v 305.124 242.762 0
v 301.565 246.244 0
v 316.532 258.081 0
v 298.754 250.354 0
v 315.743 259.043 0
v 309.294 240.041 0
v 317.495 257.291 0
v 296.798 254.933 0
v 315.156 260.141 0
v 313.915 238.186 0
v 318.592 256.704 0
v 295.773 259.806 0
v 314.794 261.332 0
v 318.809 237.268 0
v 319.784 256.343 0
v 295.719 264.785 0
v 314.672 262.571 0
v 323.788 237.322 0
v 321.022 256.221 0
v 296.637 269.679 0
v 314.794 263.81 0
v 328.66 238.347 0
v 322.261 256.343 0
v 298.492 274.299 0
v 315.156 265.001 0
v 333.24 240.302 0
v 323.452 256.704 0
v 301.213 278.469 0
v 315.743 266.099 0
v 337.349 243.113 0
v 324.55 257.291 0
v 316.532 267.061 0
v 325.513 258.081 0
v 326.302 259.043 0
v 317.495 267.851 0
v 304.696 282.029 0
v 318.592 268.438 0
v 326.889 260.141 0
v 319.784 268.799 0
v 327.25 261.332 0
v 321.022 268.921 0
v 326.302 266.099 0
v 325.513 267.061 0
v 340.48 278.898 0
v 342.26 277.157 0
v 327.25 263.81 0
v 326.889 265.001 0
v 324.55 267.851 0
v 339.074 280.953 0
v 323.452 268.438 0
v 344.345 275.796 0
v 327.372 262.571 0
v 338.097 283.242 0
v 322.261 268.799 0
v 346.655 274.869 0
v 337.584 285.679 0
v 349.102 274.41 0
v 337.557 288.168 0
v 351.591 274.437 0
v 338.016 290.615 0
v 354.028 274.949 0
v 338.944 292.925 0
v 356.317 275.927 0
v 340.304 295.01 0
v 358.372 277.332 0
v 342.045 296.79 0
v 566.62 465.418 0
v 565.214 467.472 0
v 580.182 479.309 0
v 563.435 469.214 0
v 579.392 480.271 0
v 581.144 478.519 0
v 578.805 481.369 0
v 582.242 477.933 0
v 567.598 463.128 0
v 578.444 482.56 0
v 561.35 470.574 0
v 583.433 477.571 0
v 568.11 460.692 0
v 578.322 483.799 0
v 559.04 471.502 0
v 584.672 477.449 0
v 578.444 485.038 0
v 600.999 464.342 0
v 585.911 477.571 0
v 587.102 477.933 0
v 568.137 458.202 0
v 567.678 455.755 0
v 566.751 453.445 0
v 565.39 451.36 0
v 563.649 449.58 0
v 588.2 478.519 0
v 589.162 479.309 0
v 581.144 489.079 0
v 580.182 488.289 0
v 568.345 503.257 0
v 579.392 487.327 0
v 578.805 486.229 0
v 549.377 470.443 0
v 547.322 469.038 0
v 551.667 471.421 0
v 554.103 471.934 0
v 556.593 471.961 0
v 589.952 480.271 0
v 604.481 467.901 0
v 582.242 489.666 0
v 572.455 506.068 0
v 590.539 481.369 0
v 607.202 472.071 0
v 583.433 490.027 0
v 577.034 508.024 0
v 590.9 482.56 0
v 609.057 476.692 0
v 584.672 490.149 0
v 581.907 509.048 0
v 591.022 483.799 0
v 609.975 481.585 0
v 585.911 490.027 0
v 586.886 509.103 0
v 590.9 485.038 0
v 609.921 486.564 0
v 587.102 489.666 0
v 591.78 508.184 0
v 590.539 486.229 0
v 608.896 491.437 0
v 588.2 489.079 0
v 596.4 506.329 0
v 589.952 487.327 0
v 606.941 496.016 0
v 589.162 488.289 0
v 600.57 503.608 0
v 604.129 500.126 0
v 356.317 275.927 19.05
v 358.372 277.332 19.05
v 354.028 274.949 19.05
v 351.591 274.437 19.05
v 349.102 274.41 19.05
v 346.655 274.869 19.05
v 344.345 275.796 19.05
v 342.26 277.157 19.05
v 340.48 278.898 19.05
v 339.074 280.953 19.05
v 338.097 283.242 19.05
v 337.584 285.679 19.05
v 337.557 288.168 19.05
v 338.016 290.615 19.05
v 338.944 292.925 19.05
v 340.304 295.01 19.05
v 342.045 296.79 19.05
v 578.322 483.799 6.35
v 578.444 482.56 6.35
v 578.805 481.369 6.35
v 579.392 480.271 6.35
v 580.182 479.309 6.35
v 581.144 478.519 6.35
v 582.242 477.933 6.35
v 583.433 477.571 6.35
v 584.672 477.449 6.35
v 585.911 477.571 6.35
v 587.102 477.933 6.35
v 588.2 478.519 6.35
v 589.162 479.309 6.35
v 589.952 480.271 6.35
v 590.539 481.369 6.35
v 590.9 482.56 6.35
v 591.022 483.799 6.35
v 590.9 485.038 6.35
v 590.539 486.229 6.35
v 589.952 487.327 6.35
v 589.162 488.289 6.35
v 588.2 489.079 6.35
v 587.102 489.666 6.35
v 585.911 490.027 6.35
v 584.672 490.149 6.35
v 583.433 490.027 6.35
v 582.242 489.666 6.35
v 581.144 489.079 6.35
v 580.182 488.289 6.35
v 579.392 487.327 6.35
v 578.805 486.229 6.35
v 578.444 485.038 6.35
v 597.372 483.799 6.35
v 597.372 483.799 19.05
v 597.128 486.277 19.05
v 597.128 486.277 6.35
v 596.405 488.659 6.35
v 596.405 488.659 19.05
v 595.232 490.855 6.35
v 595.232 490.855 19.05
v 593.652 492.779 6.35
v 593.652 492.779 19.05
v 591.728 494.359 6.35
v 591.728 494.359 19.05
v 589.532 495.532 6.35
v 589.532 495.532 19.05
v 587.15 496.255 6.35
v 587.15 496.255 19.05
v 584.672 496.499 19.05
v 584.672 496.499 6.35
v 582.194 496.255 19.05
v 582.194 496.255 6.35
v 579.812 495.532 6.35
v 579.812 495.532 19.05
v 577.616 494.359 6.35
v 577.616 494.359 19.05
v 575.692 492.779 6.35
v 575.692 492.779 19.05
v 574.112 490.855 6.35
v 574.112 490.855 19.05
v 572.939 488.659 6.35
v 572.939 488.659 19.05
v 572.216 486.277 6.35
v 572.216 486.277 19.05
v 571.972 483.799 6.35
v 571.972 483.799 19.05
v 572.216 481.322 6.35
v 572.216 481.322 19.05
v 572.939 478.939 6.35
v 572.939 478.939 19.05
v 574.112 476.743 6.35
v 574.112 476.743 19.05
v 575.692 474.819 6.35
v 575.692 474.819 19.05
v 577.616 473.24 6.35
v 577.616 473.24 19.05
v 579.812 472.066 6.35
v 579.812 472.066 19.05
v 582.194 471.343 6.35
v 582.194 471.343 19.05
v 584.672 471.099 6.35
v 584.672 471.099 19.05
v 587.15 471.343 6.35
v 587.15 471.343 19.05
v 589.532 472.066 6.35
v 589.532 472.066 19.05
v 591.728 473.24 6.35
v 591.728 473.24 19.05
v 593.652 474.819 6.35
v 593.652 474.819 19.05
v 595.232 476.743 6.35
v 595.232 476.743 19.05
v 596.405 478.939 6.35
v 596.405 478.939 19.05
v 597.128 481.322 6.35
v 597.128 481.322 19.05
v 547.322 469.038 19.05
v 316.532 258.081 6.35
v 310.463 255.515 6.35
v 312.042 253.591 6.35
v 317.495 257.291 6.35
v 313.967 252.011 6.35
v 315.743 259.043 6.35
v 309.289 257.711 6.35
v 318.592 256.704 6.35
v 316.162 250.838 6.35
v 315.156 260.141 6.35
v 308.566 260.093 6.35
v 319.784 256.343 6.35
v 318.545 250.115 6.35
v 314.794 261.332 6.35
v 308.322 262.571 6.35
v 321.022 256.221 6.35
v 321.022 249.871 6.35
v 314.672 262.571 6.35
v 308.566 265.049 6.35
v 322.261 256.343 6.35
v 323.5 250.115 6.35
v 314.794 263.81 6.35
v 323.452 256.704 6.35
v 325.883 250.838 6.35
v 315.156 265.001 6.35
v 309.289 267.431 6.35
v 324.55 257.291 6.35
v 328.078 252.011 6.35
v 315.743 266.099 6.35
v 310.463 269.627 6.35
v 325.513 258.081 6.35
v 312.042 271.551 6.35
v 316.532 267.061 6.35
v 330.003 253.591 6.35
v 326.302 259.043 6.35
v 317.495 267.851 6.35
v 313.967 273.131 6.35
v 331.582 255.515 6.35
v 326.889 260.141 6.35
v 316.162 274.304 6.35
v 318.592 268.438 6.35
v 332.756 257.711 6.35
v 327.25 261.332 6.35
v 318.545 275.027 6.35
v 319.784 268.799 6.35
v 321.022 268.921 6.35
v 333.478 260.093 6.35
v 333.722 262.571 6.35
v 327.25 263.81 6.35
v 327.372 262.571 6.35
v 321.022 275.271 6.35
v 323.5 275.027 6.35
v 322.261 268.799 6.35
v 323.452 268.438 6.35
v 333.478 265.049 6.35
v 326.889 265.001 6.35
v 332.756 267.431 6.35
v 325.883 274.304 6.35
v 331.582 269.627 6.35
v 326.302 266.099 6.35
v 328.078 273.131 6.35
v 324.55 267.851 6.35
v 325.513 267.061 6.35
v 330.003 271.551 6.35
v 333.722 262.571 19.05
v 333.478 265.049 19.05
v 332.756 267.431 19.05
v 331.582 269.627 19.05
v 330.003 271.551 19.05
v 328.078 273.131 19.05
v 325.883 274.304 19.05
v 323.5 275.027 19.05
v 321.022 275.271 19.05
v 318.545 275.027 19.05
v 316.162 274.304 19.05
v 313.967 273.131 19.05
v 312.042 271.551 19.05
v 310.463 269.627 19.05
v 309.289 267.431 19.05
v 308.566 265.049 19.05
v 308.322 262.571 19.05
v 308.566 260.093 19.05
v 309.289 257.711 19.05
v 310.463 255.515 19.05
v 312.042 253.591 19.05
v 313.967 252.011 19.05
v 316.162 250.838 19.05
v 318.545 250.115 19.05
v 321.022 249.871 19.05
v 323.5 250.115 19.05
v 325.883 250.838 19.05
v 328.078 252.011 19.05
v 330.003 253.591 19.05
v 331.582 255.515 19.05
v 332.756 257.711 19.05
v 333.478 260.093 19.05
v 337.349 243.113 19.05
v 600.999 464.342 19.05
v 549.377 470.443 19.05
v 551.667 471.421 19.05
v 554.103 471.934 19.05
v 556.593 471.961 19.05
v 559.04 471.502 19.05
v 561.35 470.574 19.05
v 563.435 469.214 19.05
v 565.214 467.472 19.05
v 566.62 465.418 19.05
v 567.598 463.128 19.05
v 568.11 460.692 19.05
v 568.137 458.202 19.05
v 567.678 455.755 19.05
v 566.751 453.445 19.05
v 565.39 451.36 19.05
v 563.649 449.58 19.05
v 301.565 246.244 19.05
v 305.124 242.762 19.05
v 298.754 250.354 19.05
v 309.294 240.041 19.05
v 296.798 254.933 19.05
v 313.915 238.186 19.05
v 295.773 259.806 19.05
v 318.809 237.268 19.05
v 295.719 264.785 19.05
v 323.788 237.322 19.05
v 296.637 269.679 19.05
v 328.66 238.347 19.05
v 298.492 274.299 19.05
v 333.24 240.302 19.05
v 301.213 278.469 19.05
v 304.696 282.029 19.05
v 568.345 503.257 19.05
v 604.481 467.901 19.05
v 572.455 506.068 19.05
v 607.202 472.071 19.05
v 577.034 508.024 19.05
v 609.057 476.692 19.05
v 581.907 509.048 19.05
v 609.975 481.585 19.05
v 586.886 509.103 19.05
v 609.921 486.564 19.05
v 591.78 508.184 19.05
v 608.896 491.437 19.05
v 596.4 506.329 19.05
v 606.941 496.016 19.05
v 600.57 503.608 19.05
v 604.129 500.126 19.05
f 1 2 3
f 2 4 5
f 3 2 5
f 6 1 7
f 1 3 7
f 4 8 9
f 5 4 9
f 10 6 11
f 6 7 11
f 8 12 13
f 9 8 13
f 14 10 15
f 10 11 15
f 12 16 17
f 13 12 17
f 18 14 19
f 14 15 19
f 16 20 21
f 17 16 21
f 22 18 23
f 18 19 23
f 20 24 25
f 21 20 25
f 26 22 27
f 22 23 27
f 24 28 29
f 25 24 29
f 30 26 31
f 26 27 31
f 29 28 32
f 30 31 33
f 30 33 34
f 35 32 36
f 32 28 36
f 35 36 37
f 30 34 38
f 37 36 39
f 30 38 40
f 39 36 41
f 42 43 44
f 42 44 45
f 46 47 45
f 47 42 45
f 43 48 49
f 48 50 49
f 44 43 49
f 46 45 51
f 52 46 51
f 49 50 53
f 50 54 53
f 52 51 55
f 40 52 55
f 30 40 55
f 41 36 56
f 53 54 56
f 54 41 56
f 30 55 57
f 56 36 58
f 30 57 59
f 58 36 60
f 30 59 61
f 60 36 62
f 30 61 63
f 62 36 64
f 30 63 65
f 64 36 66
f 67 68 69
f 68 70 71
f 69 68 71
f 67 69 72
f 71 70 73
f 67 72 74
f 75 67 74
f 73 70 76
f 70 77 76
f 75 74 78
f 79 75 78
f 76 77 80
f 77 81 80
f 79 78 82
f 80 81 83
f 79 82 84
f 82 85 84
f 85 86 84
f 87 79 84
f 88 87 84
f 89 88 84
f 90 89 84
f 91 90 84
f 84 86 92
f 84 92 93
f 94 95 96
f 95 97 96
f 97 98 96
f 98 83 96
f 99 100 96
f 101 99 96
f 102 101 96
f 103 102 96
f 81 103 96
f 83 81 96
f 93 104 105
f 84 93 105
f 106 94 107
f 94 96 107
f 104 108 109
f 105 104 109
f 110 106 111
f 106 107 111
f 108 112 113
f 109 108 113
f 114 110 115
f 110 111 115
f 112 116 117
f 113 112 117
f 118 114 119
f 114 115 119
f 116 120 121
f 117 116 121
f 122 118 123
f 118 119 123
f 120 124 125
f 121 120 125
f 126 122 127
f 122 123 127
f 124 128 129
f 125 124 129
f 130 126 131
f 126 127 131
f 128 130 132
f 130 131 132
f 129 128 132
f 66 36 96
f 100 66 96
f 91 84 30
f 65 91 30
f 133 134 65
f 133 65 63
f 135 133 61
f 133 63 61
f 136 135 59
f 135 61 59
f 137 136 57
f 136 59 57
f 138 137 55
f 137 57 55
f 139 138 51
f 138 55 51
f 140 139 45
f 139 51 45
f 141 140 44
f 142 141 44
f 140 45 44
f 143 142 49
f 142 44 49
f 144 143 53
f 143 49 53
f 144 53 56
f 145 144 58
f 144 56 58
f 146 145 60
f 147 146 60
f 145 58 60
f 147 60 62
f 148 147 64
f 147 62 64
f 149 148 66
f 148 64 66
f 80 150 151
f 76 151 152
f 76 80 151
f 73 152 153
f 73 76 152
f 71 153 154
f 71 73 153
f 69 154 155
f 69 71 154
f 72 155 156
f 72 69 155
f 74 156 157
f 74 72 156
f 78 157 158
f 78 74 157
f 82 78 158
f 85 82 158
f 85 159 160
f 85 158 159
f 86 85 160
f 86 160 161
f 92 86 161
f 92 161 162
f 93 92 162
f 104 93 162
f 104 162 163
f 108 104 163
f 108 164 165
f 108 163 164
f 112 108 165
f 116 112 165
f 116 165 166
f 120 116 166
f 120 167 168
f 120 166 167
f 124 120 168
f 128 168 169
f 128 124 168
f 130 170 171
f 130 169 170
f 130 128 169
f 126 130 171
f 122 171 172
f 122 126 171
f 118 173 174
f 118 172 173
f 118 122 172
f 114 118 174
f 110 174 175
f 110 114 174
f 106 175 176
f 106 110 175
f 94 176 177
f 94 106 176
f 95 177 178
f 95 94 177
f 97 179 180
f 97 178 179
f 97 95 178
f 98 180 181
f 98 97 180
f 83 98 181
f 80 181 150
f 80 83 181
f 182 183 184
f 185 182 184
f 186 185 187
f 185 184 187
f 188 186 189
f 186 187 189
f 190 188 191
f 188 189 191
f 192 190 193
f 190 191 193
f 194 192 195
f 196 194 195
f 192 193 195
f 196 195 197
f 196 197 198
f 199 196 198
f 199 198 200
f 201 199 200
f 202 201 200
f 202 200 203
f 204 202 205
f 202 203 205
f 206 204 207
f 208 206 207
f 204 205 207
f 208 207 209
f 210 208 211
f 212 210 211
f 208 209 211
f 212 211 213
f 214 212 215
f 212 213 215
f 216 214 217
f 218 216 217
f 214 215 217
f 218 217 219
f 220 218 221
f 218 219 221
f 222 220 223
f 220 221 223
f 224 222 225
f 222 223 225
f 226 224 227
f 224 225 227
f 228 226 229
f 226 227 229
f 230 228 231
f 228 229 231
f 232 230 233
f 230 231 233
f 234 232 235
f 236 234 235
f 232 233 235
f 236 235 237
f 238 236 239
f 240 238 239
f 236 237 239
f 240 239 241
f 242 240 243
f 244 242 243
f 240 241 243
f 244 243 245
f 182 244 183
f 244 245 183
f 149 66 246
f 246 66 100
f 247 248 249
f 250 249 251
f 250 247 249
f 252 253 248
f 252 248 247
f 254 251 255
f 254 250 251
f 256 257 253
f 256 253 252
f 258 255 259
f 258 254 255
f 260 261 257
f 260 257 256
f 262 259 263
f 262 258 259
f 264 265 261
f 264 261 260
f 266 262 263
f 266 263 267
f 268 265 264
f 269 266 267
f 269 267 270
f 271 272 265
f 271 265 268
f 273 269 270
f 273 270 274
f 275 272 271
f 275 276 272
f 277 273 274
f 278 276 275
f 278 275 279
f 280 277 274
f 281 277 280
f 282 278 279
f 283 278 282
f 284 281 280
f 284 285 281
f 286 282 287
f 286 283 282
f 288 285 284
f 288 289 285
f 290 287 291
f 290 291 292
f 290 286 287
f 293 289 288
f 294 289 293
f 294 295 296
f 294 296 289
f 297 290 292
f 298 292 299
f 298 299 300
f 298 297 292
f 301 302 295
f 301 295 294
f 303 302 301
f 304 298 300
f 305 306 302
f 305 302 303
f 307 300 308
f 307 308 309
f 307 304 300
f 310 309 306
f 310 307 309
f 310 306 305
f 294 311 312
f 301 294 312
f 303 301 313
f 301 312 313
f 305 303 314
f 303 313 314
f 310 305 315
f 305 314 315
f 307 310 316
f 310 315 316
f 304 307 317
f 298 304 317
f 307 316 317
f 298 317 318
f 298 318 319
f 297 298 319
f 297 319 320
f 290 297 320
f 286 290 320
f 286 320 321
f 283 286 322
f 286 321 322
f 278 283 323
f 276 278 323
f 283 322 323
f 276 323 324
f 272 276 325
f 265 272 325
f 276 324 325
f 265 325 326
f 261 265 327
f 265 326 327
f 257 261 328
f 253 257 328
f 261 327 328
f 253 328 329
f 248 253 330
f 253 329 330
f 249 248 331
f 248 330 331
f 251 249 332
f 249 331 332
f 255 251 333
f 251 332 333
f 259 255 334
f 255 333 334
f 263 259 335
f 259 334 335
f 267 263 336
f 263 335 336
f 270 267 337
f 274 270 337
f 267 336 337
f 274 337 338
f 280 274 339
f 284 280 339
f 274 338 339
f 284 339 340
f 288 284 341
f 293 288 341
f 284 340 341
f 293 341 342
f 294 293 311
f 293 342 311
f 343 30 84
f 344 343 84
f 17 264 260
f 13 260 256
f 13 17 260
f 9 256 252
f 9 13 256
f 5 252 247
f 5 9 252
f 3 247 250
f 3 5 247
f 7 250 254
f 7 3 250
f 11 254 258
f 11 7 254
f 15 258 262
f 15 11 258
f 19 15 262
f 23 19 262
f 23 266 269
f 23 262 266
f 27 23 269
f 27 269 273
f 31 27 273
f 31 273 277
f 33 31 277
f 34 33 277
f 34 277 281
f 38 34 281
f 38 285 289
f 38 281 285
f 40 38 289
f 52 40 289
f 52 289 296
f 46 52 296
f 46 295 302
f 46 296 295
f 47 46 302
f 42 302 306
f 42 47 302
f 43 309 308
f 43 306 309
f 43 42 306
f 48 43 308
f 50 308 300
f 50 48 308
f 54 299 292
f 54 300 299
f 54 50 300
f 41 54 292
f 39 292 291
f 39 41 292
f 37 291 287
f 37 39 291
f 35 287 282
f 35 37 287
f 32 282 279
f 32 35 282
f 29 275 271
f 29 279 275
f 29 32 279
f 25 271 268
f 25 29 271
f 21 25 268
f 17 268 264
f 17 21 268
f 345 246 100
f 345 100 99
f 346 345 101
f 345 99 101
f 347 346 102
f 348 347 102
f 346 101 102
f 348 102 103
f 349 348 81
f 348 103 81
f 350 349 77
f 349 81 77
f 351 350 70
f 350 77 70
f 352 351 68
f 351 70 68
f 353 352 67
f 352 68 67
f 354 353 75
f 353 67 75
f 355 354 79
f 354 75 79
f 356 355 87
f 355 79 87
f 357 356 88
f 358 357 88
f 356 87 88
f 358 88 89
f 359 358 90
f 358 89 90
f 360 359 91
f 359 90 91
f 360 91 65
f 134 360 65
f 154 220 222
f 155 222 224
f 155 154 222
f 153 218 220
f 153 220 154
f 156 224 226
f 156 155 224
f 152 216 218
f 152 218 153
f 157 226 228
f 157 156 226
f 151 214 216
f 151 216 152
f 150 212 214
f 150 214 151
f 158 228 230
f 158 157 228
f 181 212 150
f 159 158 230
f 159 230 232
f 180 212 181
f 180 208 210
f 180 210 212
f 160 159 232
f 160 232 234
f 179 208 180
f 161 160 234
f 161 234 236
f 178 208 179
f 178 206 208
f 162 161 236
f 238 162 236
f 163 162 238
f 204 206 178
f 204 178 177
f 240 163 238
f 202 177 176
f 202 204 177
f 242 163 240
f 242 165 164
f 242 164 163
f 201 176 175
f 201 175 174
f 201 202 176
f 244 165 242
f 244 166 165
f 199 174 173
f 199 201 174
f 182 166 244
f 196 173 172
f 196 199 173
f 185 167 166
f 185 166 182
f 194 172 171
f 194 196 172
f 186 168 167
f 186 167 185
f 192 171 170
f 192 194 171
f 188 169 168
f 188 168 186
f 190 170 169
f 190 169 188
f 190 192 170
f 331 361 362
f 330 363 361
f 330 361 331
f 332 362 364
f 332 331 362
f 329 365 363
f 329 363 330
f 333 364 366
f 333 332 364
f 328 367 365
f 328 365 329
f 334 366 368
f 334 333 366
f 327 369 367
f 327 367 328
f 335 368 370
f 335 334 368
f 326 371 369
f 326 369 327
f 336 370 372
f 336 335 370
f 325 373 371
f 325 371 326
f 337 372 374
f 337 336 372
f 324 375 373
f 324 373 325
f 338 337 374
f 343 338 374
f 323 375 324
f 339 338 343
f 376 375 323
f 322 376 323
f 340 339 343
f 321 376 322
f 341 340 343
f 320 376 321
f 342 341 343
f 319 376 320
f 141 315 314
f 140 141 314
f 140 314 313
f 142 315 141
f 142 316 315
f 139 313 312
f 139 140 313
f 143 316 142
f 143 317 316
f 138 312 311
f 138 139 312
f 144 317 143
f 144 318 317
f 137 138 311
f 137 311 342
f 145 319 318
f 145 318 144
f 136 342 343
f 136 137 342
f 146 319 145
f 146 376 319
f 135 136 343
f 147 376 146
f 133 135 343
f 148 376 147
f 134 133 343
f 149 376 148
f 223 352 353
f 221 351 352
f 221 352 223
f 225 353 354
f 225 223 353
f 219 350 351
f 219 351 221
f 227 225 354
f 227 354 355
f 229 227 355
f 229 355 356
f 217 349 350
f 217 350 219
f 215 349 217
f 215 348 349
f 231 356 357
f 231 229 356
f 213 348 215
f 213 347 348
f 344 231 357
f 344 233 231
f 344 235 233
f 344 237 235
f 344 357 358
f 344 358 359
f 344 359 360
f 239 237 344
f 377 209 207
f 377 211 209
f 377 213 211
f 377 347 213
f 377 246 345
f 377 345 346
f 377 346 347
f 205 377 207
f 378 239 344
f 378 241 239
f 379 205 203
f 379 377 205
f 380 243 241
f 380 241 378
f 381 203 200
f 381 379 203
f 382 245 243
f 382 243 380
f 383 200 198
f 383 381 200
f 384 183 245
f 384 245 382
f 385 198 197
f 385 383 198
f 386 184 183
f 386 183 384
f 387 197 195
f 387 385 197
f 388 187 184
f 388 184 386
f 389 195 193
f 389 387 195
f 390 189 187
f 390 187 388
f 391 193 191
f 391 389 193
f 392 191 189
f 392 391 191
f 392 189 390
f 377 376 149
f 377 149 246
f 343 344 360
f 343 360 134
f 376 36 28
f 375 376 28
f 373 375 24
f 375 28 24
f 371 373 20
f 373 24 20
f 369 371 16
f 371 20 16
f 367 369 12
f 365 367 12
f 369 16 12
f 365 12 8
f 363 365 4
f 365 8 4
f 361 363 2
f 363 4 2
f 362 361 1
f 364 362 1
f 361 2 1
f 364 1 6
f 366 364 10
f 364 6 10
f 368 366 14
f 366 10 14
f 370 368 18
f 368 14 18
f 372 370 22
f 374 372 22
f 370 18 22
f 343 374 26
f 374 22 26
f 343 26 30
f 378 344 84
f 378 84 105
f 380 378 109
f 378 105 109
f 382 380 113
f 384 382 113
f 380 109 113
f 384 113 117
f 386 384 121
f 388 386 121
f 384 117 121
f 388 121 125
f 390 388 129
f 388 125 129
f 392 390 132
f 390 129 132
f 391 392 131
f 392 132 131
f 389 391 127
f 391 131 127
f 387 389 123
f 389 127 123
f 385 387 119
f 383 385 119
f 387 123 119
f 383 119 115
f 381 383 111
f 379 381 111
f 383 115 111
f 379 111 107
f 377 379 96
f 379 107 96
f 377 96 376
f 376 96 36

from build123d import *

# Parameters (mm, degrees)
SKETCH1_R           = 6.35
BOSS_EXTRUDE1_DEPTH = 19.05
SKETCH2_R           = 12.7
CUT_EXTRUDE1_DEPTH  = 12.7


with BuildPart() as part:
    # Sketch1 → Boss-Extrude1 (new body)
    with BuildSketch(Plane.XY):
        with BuildLine():
            Line((568.345160721, 503.256723569), (304.695644733, 282.028511943))
            ThreePointArc((304.695644733, 282.028511943), (301.564919628, 246.244179632), (337.349251645, 243.113451162))
            Line((337.349251645, 243.113451162), (600.998771294, 464.341665859))
            ThreePointArc((600.998771294, 464.341665859), (604.129494863, 500.126), (568.345160721, 503.256723569))
        make_face()
        with Locations(Location((321.022448189, 262.570981553, 0), (0, 0, 180))):
            Circle(SKETCH1_R, mode=Mode.SUBTRACT)
        with Locations(Location((584.671966007, 483.799194714, 0), (0, 0, 180))):
            Circle(SKETCH1_R, mode=Mode.SUBTRACT)
        with BuildLine():
            Line((563.649075368, 449.580222357), (358.372145945, 277.33242659))
            ThreePointArc((358.372145945, 277.33242659), (340.479978874, 278.897788374), (342.045340659, 296.789955445))
            Line((342.045340659, 296.789955445), (547.322270082, 469.037751213))
            ThreePointArc((547.322270082, 469.037751213), (565.214437152, 467.472389428), (563.649075368, 449.580222357))
        make_face(mode=Mode.SUBTRACT)
    extrude(amount=BOSS_EXTRUDE1_DEPTH)

    # Sketch2 → Cut-Extrude1 (cut)
    with BuildSketch(Plane.XY.offset(19.05)):
        with Locations((321.022448189, 262.570981553)):
            Circle(SKETCH2_R)
        with Locations((584.671966007, 483.799194714)):
            Circle(SKETCH2_R)
    extrude(amount=-CUT_EXTRUDE1_DEPTH, mode=Mode.SUBTRACT)


solid = part.part
